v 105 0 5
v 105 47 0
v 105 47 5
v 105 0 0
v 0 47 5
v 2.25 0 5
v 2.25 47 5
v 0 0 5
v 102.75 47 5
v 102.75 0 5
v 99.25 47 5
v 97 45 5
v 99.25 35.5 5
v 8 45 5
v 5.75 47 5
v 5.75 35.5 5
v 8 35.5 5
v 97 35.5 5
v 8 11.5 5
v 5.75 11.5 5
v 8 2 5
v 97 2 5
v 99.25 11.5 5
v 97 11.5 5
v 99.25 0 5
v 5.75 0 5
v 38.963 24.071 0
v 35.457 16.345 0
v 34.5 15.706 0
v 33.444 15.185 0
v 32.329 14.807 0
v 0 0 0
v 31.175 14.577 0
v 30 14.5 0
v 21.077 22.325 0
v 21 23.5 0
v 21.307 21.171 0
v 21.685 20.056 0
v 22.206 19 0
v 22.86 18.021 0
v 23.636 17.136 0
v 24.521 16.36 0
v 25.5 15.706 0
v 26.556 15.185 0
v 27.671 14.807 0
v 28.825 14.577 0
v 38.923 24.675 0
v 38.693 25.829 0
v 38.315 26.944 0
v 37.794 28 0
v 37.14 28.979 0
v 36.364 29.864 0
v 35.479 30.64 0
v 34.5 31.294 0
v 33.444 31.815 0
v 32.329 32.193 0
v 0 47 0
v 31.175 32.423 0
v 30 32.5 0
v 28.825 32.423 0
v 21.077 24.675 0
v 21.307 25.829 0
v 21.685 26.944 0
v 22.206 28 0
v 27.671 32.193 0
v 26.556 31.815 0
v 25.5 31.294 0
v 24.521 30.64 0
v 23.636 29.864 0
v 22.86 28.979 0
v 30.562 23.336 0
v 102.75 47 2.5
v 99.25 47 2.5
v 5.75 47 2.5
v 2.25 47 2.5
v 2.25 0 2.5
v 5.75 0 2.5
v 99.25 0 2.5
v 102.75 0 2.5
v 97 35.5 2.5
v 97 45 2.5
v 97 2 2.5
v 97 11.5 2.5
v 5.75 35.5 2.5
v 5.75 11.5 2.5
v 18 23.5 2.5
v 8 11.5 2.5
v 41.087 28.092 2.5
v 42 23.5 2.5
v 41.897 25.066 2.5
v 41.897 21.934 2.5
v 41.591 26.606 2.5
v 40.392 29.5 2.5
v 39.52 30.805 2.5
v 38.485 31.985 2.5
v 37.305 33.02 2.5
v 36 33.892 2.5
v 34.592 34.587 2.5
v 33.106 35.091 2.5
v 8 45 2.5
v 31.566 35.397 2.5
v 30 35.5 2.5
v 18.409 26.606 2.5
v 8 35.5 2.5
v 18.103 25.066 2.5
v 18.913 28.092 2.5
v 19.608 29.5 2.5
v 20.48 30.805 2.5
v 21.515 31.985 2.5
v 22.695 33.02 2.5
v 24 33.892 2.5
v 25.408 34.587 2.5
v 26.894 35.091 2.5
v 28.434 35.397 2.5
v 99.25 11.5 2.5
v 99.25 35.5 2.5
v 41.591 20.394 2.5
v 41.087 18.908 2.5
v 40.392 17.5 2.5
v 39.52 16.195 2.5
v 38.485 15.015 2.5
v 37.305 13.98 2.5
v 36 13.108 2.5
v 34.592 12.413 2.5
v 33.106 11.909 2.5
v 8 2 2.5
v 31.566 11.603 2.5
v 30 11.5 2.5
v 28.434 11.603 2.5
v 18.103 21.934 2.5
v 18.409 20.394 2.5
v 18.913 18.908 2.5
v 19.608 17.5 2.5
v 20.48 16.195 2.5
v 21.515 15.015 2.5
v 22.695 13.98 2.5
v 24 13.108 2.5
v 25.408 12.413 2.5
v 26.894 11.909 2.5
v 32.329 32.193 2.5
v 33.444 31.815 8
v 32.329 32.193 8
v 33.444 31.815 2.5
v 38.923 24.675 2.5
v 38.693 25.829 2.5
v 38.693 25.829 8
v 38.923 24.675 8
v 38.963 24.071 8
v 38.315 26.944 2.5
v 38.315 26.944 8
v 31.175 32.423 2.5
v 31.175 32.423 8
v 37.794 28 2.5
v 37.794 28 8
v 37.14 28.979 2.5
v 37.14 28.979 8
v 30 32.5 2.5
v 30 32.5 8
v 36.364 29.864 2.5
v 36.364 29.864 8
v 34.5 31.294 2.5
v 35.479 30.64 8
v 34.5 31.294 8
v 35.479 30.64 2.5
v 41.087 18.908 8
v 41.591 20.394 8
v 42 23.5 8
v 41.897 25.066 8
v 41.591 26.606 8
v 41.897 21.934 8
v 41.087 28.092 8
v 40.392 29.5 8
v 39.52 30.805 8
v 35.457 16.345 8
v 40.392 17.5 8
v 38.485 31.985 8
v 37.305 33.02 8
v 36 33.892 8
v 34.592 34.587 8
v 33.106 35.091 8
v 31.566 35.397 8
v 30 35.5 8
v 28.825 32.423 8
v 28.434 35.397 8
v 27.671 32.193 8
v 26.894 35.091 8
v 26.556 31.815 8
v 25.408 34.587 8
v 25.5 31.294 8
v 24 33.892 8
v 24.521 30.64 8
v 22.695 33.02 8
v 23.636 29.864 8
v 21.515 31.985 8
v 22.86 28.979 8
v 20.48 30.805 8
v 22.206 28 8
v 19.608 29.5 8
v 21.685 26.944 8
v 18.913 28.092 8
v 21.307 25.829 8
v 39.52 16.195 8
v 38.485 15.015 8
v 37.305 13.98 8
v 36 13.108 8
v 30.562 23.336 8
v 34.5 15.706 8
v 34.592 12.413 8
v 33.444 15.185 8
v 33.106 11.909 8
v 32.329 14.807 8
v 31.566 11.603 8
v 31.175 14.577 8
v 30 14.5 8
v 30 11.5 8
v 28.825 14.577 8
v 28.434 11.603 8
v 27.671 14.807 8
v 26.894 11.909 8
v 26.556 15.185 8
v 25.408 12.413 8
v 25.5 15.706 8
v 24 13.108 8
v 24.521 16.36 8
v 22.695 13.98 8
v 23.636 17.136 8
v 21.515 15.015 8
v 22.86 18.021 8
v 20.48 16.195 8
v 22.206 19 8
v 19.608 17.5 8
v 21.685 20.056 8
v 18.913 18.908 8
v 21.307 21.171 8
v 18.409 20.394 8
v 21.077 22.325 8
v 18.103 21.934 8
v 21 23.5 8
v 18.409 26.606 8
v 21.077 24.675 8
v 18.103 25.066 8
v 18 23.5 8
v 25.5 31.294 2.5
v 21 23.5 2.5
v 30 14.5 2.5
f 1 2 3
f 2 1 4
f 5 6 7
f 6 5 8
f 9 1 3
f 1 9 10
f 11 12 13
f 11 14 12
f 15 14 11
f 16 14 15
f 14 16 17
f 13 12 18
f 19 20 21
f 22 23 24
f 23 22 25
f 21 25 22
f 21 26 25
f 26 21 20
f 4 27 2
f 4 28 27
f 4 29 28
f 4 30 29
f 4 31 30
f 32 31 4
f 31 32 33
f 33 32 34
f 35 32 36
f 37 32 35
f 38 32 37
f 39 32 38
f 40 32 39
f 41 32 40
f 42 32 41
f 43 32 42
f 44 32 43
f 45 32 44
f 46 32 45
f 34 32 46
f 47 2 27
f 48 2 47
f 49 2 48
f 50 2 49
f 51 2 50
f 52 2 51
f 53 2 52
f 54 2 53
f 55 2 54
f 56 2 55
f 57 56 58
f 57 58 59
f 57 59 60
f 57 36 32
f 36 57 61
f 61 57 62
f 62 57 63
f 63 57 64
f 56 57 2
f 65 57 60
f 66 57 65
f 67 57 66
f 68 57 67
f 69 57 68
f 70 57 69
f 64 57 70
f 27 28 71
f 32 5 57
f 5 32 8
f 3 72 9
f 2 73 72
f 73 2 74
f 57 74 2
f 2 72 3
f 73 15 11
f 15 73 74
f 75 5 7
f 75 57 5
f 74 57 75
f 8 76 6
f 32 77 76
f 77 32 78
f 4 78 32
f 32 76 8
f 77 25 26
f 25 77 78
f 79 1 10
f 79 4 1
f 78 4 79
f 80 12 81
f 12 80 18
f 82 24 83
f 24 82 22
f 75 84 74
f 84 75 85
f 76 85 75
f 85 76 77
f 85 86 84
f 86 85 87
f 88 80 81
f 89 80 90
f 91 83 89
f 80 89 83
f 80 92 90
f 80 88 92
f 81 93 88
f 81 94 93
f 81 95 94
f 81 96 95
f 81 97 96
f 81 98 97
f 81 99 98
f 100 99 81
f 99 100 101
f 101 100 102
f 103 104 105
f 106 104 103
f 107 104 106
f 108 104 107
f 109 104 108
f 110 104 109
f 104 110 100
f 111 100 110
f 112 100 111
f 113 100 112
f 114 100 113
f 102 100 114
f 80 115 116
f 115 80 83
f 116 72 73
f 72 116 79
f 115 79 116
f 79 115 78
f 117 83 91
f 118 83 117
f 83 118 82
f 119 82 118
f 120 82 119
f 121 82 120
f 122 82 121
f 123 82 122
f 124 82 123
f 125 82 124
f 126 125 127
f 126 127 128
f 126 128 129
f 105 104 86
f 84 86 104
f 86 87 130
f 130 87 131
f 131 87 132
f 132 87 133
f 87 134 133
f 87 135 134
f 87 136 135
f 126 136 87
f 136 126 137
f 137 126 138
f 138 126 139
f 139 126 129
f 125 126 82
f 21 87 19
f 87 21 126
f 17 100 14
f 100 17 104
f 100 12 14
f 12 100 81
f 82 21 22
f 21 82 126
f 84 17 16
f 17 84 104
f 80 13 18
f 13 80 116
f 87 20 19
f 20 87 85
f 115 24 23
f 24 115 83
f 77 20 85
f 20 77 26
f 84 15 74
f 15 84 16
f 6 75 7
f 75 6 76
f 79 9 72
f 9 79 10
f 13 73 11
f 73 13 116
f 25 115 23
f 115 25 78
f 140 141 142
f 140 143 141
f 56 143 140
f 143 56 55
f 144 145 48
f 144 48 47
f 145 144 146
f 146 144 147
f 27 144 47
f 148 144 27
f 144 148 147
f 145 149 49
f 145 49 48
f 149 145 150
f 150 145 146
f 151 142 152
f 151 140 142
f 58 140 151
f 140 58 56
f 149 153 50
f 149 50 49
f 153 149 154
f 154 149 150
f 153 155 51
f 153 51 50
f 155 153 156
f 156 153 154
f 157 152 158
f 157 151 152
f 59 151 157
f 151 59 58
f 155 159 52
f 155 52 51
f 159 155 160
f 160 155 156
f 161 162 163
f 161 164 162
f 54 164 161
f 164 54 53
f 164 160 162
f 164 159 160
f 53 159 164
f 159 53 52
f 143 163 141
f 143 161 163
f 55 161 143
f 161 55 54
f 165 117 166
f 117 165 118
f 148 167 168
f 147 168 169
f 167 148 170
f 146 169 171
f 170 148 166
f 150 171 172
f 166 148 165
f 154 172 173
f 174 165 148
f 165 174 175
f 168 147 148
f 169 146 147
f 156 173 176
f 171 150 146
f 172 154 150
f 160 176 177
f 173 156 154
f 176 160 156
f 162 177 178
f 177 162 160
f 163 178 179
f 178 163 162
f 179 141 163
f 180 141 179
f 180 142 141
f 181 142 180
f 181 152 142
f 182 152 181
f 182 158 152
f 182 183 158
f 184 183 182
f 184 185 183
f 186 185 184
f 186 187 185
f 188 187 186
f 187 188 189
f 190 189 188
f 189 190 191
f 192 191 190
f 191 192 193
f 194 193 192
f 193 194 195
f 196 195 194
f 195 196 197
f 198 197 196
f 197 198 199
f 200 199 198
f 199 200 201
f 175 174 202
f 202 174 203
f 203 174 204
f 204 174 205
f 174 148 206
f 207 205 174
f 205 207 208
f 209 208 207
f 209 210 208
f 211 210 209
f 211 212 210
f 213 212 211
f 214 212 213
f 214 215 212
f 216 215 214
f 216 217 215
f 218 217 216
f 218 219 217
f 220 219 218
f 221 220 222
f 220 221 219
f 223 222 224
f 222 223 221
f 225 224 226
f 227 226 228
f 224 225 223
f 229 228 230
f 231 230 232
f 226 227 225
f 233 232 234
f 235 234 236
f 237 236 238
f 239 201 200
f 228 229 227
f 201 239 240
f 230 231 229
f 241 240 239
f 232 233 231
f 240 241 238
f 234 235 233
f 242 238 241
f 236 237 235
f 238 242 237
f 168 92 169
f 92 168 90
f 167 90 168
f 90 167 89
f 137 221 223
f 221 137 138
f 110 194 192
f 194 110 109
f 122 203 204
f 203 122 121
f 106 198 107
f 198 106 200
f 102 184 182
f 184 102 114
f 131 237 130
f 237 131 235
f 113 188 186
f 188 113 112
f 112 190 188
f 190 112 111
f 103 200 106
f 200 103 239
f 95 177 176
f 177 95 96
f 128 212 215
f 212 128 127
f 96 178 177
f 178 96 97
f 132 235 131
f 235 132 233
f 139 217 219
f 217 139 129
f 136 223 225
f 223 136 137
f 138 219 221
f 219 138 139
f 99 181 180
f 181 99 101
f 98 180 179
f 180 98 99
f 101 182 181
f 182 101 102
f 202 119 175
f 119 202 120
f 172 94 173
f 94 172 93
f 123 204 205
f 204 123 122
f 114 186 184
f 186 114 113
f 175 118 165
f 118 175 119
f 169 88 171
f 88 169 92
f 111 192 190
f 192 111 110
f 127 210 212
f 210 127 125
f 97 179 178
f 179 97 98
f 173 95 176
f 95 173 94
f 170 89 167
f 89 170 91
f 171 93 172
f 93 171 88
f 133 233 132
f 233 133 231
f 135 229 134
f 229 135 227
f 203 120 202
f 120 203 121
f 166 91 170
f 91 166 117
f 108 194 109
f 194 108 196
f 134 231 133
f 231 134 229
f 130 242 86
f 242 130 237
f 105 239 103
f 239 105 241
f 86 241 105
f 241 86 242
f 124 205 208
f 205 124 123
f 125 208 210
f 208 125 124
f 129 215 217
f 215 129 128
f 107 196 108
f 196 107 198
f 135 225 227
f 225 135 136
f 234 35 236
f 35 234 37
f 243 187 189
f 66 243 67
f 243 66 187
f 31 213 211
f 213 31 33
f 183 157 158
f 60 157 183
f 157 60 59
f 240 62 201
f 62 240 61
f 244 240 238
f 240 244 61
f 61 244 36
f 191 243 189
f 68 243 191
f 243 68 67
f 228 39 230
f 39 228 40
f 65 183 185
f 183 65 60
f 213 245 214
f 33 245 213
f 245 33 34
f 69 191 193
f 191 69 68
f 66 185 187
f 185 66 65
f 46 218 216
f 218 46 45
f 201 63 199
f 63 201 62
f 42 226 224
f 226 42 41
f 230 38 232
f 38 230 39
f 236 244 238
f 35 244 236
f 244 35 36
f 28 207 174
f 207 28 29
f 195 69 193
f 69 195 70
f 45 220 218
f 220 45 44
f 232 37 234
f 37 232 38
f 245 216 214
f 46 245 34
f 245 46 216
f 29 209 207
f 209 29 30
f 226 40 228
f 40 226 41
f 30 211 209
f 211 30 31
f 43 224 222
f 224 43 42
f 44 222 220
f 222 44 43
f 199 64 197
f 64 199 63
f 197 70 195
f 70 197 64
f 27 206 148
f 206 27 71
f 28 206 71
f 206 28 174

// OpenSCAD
// file: Defines_v1.scad
/* spacing between the leds
 * usually around 12, can be forced
 * to 6-10 by bending strip
 */
space = 6;  

/* some space for the outermost leds
 * for better viewing angle
 */
margin = 10;

/* 15 leds (type 5050) with above spacing */
width = 15 * (5 + space) + 10 + 2 * margin;

/* box height, min. 42mm */
height = 47;

/* box depth, min 100mm for 4x3-keypad */
depth = 105;

/* max wall thickness */
thick=10;

/* grade of feet smoothness
 * below 10 looks bad
 * 10-16 is reasonable
 * above 16 takes much time to render
 */
grade = 12;

/* length of side stands 
 * should be enough to get box in right angle
 * should not exceed back of box
 */
stand = min(height + 20, depth - 40);

/* offset of usb plug from center */
usb_offs = 60;

/* calculated values */
bwidth = width + 14;
bheight = depth + 7;

/* size of led holes 
 * includes some margin for 5050 leds
 */
led = 5.75;

minimal = 1;
// main file
include <Defines_v1.scad>;

module Links() {
    union() {
        difference() {
            translate([depth / 2, height / 2, 2.5]) 
                cube([depth, height, 5], center = true);
            translate([depth / 2, height / 2, 4.5]) 
                cube([depth - 16, height - 4, 4], center = true);
            translate([depth / 2, height / 2, 4.5]) 
                cube([depth - 5, 24, 4], center = true);
            translate([4, height / 2, 4.5]) 
                cube([3.5, height + 0.1, 4], center = true);
            translate([depth - 4, height / 2, 4.5]) 
                cube([3.5, height + 0.1, 4], center = true);
            translate([30, height / 2, 4]) 
                cylinder(8.1, 9, 9, $fn=48, center = true);
        }
        translate([36, height / 2 - 2.7, 4]) rotate([0, 0, 35])
             cylinder(8, 6, 6, $fn = 3, center = true);
        translate([30, height / 2, 4]) 
            difference() {
                cylinder(8, 12, 12, $fn=48, center = true);
                cylinder(8.1, 9, 9, $fn=48, center = true);
            }            
    }
}

Links();
